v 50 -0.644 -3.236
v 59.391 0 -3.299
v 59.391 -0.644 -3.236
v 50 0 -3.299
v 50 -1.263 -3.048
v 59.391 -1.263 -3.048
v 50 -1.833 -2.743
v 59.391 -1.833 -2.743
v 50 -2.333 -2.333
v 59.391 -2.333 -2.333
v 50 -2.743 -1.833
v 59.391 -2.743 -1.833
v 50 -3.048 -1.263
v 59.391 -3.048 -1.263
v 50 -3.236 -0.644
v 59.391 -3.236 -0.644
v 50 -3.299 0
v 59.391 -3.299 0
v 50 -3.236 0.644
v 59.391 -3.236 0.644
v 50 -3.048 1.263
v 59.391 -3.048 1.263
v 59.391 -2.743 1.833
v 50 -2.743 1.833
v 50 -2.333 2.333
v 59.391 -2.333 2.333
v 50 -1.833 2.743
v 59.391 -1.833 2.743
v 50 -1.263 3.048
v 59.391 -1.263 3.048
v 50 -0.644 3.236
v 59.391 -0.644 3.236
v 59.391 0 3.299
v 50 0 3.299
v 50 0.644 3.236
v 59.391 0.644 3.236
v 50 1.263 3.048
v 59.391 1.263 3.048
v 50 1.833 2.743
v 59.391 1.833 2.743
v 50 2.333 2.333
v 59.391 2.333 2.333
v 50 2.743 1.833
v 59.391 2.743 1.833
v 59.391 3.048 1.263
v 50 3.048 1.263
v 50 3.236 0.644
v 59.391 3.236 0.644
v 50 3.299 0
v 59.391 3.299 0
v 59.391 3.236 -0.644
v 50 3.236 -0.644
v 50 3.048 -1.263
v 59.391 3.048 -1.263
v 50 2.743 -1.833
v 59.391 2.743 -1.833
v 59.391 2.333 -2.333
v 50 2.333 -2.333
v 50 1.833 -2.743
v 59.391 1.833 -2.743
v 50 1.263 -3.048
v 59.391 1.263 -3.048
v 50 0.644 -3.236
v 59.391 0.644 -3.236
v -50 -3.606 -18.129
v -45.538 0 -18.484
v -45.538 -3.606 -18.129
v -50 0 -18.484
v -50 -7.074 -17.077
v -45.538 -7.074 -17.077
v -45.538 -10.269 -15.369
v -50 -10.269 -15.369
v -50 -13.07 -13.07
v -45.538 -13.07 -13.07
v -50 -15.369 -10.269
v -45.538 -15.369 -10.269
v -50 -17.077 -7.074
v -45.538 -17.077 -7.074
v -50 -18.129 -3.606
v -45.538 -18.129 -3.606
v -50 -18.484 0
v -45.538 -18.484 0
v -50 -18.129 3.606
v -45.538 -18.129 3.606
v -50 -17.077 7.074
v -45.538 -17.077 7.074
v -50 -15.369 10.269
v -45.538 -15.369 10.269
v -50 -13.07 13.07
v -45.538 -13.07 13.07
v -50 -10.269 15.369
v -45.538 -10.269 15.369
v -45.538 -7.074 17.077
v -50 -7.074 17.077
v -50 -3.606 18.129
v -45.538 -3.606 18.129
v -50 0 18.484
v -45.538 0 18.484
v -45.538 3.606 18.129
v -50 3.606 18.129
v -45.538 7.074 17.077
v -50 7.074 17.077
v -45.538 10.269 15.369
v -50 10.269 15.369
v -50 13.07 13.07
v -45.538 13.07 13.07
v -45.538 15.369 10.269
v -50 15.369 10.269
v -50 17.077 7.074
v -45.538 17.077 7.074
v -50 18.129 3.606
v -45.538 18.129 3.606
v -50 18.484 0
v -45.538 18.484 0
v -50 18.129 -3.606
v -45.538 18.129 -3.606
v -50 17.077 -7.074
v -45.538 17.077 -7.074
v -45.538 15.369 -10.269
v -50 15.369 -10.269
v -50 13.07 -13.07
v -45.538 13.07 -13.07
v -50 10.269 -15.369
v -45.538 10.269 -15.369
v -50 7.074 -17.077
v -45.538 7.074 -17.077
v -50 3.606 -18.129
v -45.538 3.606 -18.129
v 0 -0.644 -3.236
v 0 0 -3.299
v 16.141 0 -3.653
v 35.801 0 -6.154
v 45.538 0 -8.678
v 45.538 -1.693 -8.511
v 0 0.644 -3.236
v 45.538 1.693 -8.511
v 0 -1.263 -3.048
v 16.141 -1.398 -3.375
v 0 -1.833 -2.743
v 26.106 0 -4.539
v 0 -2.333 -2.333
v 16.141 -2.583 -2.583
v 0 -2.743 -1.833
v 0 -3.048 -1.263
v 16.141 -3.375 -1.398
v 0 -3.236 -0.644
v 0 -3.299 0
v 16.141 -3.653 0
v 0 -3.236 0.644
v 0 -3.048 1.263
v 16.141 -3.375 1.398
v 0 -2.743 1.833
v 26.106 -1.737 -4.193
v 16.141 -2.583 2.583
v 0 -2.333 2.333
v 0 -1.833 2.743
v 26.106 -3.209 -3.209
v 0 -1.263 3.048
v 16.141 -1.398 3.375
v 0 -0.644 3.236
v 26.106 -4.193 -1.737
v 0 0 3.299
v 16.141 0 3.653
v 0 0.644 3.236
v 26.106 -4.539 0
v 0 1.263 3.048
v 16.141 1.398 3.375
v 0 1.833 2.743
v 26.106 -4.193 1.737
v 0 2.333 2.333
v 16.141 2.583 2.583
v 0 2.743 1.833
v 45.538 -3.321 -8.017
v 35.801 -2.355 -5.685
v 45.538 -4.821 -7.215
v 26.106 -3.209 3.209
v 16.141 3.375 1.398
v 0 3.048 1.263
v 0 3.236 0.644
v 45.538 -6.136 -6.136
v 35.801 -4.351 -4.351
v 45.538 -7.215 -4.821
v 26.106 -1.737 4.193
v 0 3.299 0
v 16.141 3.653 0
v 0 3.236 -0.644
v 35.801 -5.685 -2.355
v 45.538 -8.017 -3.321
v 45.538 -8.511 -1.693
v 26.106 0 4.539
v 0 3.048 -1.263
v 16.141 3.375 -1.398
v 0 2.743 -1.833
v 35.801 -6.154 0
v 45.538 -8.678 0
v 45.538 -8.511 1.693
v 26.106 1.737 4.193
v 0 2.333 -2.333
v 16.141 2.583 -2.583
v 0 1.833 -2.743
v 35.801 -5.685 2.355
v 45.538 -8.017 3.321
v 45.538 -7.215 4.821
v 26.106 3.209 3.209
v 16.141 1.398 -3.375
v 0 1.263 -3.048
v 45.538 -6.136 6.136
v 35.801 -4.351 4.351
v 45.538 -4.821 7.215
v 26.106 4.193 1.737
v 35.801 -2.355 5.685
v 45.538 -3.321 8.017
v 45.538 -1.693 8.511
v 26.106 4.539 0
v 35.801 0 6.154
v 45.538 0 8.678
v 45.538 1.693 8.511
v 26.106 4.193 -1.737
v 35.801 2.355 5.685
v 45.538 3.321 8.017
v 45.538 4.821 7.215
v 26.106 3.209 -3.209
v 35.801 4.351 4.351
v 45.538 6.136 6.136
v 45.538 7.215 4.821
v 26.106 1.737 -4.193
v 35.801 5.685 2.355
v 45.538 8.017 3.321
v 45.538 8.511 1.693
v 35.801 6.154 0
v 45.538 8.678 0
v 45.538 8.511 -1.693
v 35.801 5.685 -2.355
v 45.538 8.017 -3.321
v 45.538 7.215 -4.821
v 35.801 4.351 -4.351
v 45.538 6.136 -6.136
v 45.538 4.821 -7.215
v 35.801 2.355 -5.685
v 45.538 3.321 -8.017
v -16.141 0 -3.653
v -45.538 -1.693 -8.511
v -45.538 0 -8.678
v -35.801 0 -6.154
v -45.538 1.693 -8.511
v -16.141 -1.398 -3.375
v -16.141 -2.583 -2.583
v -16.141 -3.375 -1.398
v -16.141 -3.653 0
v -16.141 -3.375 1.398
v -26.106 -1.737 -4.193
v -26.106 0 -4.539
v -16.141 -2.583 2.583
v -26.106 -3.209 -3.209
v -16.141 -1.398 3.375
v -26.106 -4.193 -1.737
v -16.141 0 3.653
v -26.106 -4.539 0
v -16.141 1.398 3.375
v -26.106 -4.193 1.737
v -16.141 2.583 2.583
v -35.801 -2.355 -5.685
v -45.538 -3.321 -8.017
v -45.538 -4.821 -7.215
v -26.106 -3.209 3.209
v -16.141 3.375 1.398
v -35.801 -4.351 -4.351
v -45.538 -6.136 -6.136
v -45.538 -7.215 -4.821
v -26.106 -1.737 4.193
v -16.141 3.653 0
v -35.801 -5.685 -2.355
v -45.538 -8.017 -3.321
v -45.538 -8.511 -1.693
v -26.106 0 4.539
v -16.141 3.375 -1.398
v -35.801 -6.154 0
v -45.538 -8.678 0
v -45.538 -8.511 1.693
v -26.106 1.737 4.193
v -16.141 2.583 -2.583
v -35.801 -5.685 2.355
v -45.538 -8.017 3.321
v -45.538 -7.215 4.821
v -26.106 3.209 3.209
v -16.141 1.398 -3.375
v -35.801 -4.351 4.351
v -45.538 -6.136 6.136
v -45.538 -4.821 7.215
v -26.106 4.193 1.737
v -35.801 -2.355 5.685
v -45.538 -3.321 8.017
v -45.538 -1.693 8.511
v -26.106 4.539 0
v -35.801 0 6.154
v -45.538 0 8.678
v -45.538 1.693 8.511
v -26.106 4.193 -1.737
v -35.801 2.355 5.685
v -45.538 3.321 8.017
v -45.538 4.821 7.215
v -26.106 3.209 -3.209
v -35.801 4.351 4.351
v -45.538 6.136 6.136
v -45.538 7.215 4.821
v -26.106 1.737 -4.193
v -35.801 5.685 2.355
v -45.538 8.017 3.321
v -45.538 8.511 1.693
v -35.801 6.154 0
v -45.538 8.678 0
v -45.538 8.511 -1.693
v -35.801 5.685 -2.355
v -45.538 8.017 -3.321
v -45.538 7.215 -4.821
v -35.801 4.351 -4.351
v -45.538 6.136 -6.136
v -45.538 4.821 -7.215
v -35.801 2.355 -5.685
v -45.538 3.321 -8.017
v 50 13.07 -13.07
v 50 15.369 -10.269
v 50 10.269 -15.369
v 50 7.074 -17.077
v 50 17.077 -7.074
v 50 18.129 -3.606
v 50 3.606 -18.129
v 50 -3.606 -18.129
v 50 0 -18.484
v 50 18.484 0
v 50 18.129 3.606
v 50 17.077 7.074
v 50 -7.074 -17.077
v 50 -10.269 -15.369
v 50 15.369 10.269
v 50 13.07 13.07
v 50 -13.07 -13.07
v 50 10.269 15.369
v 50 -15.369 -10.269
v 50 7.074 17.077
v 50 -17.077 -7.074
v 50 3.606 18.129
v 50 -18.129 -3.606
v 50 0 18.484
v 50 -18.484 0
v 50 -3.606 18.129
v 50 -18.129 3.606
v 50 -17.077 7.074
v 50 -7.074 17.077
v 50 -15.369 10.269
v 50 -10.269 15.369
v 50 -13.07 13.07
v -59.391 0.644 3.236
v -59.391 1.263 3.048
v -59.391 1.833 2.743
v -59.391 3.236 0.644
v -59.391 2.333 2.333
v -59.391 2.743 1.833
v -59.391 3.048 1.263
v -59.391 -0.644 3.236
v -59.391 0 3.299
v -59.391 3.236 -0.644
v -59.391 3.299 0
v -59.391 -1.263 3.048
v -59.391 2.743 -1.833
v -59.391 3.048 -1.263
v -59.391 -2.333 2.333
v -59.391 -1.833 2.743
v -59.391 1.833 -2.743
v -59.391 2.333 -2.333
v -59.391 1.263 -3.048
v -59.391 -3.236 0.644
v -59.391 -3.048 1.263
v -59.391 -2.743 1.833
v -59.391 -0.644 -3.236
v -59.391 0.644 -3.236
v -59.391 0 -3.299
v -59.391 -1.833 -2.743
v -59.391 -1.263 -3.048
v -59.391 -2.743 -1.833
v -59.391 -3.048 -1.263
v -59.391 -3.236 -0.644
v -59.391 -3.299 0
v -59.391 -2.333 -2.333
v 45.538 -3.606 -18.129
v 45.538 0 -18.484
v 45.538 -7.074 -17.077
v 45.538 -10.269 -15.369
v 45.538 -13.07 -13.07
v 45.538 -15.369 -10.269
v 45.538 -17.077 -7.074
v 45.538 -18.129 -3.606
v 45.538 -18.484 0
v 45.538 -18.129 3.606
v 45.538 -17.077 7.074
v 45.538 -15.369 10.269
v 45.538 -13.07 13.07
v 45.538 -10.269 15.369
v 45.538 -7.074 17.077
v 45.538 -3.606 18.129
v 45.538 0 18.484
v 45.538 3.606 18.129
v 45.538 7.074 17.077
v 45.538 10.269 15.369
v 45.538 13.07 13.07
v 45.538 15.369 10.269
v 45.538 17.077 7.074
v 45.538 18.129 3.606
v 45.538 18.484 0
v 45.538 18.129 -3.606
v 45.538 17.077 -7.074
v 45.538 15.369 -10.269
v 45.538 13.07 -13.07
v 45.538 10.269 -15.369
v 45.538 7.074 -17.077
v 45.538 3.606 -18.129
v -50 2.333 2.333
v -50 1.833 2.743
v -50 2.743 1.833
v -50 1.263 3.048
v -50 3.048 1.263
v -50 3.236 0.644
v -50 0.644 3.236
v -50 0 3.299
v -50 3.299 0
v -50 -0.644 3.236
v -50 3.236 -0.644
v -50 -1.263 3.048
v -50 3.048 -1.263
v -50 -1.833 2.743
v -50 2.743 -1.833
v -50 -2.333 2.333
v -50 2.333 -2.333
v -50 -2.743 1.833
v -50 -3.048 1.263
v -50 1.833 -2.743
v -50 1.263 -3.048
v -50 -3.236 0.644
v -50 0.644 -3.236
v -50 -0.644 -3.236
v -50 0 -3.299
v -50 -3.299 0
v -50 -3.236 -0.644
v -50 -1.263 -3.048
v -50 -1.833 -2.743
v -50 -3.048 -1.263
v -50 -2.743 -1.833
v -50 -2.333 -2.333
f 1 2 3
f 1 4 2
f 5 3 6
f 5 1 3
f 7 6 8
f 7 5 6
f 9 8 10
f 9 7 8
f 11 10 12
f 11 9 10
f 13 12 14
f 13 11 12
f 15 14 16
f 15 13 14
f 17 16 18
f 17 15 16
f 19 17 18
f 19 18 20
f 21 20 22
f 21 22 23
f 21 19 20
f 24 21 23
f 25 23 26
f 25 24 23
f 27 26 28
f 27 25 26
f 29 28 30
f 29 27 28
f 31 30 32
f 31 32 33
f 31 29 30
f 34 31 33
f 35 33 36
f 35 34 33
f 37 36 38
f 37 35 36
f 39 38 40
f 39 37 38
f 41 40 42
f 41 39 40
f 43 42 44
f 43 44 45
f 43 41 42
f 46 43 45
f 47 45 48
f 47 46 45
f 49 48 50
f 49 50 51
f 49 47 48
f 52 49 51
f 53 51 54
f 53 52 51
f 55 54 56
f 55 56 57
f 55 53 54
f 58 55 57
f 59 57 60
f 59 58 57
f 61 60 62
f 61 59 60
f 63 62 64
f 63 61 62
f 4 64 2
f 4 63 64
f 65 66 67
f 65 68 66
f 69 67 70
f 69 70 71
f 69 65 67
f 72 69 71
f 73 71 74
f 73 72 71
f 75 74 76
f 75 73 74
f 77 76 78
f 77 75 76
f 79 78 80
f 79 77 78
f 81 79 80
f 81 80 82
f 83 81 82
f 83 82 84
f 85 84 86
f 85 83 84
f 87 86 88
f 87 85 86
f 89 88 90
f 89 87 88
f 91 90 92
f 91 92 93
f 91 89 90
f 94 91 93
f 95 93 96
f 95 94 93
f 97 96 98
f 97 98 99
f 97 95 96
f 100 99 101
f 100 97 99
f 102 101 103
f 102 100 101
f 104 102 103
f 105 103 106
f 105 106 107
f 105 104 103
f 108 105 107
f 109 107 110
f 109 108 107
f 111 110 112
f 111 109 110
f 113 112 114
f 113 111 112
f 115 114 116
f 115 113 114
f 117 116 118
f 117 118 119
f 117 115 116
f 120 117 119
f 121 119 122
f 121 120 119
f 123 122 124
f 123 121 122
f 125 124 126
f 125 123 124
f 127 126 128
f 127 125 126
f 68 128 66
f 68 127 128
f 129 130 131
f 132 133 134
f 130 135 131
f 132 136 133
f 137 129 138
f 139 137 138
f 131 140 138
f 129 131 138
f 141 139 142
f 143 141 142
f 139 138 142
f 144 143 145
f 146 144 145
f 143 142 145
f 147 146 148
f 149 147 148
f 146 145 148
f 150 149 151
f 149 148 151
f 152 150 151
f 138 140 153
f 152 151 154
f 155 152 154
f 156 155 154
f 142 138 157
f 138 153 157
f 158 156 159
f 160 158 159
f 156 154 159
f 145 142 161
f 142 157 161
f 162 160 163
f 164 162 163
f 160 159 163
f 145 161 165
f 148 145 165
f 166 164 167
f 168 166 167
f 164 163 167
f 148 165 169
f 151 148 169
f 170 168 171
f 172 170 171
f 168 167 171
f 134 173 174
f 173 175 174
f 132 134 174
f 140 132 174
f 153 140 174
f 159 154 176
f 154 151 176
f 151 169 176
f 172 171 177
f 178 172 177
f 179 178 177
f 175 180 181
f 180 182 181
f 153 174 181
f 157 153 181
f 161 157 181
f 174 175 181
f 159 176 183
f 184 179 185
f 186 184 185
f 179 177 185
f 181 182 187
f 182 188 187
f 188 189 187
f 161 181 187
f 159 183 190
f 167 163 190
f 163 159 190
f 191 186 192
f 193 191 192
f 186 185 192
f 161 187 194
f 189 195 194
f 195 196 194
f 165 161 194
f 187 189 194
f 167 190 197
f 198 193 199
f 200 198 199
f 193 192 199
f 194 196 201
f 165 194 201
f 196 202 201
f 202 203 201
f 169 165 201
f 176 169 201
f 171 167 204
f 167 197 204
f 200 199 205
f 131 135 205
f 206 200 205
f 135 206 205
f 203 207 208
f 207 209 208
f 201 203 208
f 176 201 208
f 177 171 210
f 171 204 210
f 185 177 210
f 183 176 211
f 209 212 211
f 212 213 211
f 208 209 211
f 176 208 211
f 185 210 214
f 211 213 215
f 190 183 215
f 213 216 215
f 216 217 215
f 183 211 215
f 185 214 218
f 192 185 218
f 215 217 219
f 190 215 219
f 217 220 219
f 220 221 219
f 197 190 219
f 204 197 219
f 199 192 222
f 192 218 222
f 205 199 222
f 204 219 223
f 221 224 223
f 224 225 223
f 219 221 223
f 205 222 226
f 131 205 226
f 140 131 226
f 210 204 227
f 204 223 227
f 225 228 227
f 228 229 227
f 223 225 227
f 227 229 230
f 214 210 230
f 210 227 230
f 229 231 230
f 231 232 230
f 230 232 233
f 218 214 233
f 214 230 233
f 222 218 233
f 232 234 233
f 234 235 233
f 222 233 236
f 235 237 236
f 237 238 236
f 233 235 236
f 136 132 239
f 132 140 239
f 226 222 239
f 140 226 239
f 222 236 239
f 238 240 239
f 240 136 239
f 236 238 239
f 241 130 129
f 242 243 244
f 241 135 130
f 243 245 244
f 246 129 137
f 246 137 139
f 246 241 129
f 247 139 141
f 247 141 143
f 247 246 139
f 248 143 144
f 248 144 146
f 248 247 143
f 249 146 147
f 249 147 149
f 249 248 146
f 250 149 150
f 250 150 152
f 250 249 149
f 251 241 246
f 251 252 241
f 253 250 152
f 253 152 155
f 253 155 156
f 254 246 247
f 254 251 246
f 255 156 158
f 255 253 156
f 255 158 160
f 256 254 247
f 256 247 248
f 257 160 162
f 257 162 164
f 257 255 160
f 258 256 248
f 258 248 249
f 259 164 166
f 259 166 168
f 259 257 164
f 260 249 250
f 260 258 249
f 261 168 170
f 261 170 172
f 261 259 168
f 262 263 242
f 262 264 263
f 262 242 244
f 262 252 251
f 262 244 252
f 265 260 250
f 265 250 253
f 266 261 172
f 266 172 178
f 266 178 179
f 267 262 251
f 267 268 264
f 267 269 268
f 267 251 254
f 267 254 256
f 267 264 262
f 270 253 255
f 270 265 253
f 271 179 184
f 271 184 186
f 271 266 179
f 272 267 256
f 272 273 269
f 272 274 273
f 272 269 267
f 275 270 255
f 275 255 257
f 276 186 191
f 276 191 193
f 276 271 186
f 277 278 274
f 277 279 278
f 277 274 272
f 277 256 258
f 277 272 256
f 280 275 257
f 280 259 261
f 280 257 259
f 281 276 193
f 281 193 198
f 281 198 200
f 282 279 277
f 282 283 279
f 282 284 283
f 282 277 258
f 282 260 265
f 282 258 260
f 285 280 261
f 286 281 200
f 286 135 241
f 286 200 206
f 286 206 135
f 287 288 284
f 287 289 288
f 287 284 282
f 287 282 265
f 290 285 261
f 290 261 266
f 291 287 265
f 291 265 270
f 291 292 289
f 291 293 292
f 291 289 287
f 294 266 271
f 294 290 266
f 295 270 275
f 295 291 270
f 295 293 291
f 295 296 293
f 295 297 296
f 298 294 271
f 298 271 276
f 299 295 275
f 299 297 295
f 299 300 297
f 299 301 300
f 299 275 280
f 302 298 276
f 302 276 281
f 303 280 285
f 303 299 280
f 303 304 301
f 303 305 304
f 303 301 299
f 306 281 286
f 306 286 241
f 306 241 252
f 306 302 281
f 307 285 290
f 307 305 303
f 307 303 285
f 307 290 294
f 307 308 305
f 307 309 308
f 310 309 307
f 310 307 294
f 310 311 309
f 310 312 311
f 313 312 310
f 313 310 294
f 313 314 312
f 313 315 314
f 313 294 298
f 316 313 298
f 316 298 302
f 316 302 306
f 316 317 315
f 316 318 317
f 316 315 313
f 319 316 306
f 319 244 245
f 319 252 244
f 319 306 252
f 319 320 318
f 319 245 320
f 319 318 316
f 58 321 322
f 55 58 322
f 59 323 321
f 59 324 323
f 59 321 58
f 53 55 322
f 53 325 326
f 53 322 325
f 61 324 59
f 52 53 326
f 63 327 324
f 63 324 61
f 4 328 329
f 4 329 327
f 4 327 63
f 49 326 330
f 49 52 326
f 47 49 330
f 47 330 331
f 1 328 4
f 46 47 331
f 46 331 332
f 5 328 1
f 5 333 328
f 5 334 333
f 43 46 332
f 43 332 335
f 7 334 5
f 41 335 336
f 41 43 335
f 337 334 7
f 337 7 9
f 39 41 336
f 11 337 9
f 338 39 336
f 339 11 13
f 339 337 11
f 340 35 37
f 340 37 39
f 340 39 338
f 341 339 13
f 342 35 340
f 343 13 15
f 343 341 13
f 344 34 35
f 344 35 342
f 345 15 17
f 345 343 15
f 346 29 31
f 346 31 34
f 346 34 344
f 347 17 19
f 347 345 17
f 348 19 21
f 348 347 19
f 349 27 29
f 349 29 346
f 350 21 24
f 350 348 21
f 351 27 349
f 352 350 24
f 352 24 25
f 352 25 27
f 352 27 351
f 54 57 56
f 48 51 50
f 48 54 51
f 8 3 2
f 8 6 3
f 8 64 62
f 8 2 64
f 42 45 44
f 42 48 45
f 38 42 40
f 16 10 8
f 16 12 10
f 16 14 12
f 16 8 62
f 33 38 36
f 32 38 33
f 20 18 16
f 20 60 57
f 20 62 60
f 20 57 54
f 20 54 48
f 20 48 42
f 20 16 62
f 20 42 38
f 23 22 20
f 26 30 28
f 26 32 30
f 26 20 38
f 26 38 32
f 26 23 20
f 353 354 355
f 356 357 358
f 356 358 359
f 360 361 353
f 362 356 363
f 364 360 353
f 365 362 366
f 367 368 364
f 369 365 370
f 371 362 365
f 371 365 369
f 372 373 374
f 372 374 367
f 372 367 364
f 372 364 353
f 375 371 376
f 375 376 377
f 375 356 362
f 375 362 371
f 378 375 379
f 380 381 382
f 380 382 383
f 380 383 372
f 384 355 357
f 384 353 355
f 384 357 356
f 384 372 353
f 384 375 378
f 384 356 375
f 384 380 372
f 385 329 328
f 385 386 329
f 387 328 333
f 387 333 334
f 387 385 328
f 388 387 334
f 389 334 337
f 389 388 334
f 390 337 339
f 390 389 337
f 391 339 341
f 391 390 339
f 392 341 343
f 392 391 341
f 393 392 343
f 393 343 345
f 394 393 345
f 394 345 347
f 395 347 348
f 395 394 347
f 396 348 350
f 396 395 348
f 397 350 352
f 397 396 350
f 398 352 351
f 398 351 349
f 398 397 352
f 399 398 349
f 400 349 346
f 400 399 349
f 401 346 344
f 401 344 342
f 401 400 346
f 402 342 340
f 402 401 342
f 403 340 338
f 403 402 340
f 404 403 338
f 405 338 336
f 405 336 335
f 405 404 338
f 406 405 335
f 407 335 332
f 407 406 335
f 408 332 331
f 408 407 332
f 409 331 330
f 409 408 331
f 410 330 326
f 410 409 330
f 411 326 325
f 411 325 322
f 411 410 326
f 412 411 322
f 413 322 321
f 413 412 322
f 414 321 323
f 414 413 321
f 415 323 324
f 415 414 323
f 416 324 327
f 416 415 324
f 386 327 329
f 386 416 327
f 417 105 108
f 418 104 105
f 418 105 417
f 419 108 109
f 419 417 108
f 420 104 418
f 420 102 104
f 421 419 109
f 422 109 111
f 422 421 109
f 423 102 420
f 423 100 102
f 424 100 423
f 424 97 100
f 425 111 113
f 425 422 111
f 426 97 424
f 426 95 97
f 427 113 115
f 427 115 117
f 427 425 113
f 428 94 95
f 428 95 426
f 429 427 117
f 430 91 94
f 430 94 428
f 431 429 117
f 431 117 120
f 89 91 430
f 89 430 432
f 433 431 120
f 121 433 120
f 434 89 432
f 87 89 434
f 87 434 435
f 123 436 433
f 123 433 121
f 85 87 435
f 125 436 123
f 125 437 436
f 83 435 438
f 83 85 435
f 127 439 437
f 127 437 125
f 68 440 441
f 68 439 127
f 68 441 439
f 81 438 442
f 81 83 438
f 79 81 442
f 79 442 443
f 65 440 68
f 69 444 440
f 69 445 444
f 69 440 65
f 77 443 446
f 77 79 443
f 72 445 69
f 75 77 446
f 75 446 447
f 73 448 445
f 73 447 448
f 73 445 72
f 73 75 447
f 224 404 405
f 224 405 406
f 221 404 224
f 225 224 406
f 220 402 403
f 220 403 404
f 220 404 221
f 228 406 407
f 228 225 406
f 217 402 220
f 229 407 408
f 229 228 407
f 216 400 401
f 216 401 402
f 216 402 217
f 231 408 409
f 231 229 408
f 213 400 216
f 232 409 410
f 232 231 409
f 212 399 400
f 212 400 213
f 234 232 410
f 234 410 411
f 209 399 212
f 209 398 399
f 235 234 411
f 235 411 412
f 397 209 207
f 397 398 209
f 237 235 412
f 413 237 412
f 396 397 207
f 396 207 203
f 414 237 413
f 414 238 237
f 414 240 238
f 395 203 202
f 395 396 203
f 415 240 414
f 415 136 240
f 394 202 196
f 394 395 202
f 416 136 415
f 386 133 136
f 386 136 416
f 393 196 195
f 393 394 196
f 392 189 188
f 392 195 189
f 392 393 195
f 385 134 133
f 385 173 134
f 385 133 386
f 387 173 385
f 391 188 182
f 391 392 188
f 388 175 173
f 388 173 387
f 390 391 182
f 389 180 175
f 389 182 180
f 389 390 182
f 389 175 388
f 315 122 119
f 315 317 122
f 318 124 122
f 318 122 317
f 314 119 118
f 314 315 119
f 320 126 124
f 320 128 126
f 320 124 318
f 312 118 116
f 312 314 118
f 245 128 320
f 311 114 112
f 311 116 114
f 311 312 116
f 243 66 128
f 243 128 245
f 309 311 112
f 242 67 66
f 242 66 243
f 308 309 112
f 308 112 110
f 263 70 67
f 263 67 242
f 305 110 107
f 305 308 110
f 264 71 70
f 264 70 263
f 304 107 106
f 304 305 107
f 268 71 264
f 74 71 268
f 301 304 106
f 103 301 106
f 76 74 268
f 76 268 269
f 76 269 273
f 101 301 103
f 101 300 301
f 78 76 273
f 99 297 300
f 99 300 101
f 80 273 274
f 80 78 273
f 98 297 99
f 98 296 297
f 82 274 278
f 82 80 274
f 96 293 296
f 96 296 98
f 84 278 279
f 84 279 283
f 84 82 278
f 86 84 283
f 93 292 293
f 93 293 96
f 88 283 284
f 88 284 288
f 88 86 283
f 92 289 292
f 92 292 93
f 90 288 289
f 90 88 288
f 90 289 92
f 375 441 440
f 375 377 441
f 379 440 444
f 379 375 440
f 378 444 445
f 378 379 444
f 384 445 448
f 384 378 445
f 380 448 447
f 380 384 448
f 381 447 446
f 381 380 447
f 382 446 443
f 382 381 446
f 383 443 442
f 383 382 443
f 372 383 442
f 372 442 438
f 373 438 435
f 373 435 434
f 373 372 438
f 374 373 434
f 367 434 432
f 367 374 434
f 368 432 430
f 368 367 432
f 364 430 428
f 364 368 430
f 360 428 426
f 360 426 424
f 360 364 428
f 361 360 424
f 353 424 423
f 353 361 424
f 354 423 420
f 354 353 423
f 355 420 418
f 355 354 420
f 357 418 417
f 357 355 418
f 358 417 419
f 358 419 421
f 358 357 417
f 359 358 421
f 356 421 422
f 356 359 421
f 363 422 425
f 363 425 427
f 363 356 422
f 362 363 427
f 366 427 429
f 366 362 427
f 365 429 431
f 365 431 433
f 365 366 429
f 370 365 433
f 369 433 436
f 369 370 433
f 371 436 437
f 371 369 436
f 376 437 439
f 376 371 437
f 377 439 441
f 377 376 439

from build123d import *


with BuildPart() as part:
    # Sketch1 → Revolve1 (revolve)
    with BuildSketch(Plane(origin=(0, 0, 0), x_dir=(1, 0, 0), z_dir=(0, 1, 0))):
        with BuildLine():
            Line((-50, 10.152284264), (-50, 3.299492386))
            Line((-50, 3.299492386), (-59.390862944, 3.299492386))
            Line((-59.390862944, 3.299492386), (-59.390862944, 0))
            Line((-59.390862944, 0), (59.390862944, 0))
            Line((59.390862944, 0), (59.390862944, 3.299492386))
            Line((59.390862944, 3.299492386), (50, 3.299492386))
            Line((50, 3.299492386), (50, 10.152284264))
            Line((50, 10.152284264), (50, 18.484379762))
            Line((50, 18.484379762), (45.53834268, 18.484379762))
            Line((45.53834268, 18.484379762), (45.53834268, 8.678003166))
            add(Edge.make_bspline(
                [(0, 3.299492386), (14.134308112, 3.247838543), (28.352749593, 3.964388507), (42.936088831, 7.876240038), (45.53834268, 8.678003166)],
                knots=[0, 0, 0, 0, 0.749456369, 0.909412715, 0.909412715, 0.909412715, 0.909412715], degree=3))
            add(Edge.make_bspline(
                [(0, 3.299492386), (-14.134308112, 3.247838543), (-28.352749592, 3.964388507), (-42.936088831, 7.876240038), (-45.53834268, 8.678003166)],
                knots=[0, 0, 0, 0, 0.749456369, 0.909412715, 0.909412715, 0.909412715, 0.909412715], degree=3))
            Line((-45.53834268, 8.678003166), (-45.53834268, 18.484379762))
            Line((-45.53834268, 18.484379762), (-50, 18.484379762))
            Line((-50, 18.484379762), (-50, 10.152284264))
        make_face()
    revolve(axis=Axis((0, 0, 0), (-1, 0, 0)))


solid = part.part
